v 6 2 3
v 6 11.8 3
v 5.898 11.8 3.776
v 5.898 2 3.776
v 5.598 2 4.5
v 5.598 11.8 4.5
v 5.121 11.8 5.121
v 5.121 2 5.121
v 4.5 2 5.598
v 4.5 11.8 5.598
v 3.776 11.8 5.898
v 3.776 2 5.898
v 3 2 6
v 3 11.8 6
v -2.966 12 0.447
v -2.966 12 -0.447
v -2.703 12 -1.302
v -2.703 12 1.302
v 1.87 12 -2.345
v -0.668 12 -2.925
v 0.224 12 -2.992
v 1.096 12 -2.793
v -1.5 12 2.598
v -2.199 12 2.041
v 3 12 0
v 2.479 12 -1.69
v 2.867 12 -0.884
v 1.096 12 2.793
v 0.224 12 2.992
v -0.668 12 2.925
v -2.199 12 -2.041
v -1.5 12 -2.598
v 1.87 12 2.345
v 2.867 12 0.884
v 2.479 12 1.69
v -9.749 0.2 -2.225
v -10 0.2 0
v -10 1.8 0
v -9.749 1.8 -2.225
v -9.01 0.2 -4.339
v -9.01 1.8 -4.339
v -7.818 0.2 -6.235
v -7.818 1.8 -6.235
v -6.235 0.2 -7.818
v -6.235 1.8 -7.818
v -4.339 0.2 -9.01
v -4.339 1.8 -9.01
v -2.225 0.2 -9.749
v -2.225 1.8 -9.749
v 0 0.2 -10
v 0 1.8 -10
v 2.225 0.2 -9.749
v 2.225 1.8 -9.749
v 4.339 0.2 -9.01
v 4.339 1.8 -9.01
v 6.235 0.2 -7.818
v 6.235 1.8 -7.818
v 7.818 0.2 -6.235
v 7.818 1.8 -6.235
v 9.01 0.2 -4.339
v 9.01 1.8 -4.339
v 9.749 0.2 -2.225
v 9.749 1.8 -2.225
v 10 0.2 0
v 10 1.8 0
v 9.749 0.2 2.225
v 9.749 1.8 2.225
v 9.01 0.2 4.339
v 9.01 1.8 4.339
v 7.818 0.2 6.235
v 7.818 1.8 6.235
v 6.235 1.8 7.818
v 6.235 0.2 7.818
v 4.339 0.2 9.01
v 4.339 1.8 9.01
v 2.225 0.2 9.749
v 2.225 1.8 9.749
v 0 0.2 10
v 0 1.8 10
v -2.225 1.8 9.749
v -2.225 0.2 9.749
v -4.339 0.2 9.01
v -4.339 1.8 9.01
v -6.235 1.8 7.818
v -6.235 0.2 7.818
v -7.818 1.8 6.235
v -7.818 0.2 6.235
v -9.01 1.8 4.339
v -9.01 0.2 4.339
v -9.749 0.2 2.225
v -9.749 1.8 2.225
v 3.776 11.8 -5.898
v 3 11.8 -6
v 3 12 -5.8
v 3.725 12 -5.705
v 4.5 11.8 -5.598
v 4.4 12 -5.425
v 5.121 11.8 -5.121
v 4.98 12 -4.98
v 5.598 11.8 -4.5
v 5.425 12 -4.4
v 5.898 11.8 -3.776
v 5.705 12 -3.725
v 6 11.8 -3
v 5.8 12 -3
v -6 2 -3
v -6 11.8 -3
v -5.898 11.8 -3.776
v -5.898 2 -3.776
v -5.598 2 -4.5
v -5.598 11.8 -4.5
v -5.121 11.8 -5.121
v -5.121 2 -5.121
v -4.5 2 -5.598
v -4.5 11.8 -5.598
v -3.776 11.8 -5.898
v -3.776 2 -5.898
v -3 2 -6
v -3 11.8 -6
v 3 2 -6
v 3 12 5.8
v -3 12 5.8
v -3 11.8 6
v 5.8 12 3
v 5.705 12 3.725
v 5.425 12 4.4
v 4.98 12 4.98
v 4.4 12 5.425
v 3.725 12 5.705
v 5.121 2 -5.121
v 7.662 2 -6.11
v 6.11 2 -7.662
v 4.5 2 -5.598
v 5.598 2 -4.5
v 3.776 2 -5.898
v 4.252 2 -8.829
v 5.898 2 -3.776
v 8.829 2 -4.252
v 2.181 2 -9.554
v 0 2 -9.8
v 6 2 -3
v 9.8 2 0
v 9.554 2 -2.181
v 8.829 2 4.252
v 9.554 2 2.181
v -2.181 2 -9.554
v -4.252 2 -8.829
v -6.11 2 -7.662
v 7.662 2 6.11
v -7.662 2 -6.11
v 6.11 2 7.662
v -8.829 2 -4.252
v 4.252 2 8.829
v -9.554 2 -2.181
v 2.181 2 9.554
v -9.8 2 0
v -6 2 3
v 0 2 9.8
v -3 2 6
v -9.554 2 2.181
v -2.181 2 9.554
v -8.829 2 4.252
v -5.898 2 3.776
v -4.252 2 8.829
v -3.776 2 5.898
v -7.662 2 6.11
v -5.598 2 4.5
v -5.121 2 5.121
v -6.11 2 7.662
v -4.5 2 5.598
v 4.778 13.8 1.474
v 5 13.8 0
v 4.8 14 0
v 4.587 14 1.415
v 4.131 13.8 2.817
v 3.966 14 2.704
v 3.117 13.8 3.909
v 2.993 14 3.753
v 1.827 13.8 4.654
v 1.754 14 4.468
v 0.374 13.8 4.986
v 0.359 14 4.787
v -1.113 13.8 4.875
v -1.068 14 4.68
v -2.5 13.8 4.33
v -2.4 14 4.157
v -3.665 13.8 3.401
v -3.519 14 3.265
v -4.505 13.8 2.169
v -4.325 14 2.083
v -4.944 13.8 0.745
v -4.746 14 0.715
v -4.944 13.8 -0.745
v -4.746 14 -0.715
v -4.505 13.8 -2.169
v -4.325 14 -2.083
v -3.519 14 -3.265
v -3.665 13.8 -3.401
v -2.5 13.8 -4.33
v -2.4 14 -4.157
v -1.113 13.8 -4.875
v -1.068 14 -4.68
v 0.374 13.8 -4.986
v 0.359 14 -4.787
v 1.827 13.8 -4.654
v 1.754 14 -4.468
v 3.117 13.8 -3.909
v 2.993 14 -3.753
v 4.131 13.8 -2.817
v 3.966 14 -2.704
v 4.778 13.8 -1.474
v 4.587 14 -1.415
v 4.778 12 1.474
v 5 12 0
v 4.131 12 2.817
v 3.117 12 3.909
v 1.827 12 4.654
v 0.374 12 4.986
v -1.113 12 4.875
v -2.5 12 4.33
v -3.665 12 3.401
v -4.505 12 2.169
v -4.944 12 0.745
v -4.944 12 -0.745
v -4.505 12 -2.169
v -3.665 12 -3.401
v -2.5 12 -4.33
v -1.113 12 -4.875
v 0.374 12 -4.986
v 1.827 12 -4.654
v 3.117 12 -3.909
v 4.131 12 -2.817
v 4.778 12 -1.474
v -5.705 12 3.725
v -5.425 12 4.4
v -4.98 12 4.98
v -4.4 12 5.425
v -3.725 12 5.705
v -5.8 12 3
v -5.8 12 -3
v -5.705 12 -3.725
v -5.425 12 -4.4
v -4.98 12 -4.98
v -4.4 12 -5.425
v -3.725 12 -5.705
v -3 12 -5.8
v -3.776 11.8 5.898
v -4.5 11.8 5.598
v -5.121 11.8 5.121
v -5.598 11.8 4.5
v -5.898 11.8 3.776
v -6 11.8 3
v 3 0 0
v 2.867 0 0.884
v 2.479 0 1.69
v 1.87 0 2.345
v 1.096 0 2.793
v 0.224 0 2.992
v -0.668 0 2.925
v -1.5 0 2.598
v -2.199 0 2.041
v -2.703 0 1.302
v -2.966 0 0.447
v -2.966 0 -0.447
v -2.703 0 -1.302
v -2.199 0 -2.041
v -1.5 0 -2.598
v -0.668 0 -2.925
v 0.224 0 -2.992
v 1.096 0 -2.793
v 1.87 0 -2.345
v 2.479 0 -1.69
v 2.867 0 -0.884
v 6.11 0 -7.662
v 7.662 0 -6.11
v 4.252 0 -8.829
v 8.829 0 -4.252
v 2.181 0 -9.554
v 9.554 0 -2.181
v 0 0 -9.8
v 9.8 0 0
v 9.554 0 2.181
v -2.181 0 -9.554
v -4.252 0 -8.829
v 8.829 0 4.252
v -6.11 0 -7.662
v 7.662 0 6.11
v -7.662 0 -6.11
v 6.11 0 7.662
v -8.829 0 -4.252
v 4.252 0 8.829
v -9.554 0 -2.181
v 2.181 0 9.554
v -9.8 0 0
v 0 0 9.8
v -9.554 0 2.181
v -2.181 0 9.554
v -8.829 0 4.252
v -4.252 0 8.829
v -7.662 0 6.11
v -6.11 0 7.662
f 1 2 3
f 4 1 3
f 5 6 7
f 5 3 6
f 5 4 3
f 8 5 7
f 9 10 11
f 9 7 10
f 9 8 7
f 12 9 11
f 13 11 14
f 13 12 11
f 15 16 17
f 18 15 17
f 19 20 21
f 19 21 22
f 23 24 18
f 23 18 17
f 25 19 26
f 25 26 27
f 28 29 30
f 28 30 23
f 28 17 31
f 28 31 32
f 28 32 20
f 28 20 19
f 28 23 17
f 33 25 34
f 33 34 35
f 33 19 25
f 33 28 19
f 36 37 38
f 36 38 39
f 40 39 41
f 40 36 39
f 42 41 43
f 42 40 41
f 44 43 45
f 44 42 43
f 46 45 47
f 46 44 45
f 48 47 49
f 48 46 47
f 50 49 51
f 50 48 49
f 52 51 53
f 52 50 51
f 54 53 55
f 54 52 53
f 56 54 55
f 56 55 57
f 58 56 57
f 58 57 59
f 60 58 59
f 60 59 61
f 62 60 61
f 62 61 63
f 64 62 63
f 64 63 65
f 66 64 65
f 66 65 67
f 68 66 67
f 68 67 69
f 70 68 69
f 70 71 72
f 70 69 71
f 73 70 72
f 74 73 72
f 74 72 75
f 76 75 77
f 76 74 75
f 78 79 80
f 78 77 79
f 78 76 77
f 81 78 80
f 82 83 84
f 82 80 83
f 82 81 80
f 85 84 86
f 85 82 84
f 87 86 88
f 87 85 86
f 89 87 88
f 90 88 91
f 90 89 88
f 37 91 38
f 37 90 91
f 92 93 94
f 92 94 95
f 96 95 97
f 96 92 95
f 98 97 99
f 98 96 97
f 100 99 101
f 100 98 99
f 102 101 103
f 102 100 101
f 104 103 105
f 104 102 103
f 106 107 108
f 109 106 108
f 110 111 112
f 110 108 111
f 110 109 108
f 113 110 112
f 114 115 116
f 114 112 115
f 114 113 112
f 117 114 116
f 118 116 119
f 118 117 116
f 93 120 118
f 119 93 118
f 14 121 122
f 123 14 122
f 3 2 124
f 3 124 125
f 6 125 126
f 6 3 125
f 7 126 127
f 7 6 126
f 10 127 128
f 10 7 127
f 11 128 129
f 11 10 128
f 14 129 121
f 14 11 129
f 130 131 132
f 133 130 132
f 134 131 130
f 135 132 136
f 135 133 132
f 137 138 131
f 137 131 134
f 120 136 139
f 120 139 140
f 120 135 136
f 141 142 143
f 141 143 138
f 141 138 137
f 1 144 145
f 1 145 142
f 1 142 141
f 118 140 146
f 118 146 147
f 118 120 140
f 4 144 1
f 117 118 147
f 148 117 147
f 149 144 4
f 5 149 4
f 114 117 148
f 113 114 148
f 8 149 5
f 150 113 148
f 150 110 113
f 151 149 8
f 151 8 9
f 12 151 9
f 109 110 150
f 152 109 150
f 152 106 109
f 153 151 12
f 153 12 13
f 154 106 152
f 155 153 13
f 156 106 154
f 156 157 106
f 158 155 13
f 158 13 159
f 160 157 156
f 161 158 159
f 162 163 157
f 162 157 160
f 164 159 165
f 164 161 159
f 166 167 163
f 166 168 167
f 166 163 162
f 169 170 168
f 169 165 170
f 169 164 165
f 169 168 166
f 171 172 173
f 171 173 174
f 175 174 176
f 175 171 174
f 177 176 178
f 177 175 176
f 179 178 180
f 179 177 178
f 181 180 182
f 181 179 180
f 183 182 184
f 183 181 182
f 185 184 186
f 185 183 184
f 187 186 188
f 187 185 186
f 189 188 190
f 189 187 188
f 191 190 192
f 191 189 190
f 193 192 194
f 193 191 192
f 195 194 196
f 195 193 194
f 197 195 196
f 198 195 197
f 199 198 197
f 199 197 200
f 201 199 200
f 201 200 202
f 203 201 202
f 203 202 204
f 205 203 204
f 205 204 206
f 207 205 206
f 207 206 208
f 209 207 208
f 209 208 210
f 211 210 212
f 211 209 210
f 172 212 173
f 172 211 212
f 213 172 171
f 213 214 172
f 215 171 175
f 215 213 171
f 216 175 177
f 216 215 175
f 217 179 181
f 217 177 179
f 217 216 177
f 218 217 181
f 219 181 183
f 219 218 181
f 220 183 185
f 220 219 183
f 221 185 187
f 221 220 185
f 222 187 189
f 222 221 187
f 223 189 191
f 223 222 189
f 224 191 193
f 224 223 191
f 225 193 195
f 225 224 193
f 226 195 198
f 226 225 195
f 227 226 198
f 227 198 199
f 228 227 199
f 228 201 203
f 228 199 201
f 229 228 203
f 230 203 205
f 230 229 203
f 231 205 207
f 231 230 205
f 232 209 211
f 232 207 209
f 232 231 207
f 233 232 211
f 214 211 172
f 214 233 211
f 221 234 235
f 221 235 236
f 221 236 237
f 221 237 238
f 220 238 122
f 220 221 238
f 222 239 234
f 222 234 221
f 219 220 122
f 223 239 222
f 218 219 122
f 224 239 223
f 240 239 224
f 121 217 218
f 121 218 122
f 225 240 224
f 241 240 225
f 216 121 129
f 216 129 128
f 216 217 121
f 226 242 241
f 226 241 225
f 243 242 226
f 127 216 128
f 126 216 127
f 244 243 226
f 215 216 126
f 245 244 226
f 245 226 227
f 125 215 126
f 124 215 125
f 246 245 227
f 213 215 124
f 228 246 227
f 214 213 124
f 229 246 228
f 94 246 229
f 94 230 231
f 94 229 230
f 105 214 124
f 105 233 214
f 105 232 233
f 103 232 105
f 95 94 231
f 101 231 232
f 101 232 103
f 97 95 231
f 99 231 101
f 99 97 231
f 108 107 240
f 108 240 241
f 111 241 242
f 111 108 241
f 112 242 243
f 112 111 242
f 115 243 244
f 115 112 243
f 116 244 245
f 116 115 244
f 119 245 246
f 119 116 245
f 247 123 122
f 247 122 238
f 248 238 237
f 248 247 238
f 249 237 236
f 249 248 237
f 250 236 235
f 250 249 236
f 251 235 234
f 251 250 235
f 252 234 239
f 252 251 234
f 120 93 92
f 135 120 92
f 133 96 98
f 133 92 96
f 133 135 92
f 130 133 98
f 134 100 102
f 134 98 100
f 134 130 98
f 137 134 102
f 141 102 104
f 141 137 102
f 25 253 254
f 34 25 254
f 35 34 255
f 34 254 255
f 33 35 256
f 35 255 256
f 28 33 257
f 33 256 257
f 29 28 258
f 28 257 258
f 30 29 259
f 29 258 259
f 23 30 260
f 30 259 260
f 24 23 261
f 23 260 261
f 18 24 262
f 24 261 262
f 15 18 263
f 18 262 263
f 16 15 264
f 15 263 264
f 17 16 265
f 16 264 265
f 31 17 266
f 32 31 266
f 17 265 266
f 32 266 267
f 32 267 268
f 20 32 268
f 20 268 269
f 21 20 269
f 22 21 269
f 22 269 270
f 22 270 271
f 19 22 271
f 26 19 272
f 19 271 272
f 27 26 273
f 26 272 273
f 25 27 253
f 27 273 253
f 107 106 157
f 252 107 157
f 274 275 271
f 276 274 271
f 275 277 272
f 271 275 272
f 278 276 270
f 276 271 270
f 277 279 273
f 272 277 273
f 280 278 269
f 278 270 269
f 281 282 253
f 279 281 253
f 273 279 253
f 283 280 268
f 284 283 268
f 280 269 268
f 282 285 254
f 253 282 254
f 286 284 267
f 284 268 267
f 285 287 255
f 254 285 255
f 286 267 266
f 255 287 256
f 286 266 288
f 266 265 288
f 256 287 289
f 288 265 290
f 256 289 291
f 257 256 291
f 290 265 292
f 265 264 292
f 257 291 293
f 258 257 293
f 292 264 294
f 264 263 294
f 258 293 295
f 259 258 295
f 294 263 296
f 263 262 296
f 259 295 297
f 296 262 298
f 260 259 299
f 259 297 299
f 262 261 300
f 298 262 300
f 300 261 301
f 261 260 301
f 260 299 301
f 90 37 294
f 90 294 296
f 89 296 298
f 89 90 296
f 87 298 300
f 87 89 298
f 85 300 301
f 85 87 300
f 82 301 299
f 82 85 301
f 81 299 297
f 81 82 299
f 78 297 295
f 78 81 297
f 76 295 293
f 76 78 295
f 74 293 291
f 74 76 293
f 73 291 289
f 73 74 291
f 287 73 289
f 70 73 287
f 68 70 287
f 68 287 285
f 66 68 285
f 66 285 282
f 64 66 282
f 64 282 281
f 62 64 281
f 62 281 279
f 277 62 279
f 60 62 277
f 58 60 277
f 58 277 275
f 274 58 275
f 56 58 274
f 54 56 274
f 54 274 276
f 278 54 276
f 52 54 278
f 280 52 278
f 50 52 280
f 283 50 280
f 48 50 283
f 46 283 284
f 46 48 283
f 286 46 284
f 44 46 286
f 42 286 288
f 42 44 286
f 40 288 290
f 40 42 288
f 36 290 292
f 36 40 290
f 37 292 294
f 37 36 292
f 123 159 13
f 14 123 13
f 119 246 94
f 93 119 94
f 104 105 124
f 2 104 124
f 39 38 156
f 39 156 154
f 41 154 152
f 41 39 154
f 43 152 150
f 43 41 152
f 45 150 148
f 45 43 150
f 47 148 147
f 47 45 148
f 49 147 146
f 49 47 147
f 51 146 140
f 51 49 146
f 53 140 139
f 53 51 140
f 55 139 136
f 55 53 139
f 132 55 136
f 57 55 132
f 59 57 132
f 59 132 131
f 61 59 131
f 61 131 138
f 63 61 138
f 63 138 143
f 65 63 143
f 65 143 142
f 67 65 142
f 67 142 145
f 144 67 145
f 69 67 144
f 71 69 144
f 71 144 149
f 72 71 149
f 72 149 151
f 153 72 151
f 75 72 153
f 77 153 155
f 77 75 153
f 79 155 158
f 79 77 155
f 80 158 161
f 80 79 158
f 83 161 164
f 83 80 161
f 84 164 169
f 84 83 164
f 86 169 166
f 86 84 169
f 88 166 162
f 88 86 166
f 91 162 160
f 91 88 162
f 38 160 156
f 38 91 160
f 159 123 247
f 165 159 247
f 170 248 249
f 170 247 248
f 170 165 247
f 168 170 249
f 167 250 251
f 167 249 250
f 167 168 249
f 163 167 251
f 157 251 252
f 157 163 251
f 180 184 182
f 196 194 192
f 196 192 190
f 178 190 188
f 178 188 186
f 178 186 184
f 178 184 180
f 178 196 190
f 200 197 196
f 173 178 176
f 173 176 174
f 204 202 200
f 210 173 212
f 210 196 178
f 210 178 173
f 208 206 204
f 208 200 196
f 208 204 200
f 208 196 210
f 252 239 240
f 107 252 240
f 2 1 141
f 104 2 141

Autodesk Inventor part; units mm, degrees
ref_plane "YZ Plane" through (0, 0, 0) normal (1, 0, 0) x (0, 1, 0)
ref_plane "XZ Plane" through (0, 0, 0) normal (0, 1, 0) x (-1, 0, 0)
ref_plane "XY Plane" through (0, 0, 0) normal (0, 0, 1) x (1, 0, 0)
sketch "Boceto1" plane through (0, 0, 0) normal (0, 1, 0) x (-1, 0, 0)
  circle A0 centre (0, 0) radius 10
  dimension "d0" = 20
extrude "Extrusión1" add sketch "Boceto1" along normal blind 2
sketch "Boceto2" plane through (0, 2, 0) normal (0, 1, 0) x (1, 0, 0)
  line L0 (-3, -6) -> (3, -6)
  line L1 (6, -3) -> (6, 3)
  line L2 (3, 6) -> (-3, 6)
  line L3 (-6, 3) -> (-6, -3)
  arc A0 (-3, 6) -> (-6, 3) centre (-3, 3) ccw
  arc A1 (-6, -3) -> (-3, -6) centre (-3, -3) ccw
  arc A2 (3, -6) -> (6, -3) centre (3, -3) ccw
  arc A3 (6, 3) -> (3, 6) centre (3, 3) ccw
  point P0 (0, 0)
  point P1 (-6, -6)
  point P2 (6, 6)
  point P3 (-6, 6)
  point P4 (0, 6)
  point P5 (-6, 0)
  dimension "d3" = 12
  dimension "d4" = 12
  dimension "d5" = 3
extrude "Extrusión2" add sketch "Boceto2" along normal blind 10
sketch "Boceto3" plane through (0, 12, 0) normal (0, 1, 0) x (1, 0, 0)
  circle A0 centre (0, 0) radius 5
  dimension "d8" = 10
extrude "Extrusión3" add sketch "Boceto3" along normal blind 2
sketch "Boceto4" plane through (0, 0, 0) normal (0, -1, 0) x (1, 0, 0)
  circle A0 centre (0, 0) radius 3
  dimension "d11" = 6
extrude "Extrusión4" cut sketch "Boceto4" against normal blind 12
chamfer "Chaflán1" distance 0.2 angle 45 11 edges at (-5, 14, 0) (6, 12, 0) (5.1213, 12, -5.1213) (0, 12, -6) (-5.1213, 12, -5.1213) (-6, 12, 0) (-5.1213, 12, 5.1213) (0, 12, 6) (5.1213, 12, 5.1213) (10, 2, 0) (10, 0, 0)
properties part number "Front_bush"
